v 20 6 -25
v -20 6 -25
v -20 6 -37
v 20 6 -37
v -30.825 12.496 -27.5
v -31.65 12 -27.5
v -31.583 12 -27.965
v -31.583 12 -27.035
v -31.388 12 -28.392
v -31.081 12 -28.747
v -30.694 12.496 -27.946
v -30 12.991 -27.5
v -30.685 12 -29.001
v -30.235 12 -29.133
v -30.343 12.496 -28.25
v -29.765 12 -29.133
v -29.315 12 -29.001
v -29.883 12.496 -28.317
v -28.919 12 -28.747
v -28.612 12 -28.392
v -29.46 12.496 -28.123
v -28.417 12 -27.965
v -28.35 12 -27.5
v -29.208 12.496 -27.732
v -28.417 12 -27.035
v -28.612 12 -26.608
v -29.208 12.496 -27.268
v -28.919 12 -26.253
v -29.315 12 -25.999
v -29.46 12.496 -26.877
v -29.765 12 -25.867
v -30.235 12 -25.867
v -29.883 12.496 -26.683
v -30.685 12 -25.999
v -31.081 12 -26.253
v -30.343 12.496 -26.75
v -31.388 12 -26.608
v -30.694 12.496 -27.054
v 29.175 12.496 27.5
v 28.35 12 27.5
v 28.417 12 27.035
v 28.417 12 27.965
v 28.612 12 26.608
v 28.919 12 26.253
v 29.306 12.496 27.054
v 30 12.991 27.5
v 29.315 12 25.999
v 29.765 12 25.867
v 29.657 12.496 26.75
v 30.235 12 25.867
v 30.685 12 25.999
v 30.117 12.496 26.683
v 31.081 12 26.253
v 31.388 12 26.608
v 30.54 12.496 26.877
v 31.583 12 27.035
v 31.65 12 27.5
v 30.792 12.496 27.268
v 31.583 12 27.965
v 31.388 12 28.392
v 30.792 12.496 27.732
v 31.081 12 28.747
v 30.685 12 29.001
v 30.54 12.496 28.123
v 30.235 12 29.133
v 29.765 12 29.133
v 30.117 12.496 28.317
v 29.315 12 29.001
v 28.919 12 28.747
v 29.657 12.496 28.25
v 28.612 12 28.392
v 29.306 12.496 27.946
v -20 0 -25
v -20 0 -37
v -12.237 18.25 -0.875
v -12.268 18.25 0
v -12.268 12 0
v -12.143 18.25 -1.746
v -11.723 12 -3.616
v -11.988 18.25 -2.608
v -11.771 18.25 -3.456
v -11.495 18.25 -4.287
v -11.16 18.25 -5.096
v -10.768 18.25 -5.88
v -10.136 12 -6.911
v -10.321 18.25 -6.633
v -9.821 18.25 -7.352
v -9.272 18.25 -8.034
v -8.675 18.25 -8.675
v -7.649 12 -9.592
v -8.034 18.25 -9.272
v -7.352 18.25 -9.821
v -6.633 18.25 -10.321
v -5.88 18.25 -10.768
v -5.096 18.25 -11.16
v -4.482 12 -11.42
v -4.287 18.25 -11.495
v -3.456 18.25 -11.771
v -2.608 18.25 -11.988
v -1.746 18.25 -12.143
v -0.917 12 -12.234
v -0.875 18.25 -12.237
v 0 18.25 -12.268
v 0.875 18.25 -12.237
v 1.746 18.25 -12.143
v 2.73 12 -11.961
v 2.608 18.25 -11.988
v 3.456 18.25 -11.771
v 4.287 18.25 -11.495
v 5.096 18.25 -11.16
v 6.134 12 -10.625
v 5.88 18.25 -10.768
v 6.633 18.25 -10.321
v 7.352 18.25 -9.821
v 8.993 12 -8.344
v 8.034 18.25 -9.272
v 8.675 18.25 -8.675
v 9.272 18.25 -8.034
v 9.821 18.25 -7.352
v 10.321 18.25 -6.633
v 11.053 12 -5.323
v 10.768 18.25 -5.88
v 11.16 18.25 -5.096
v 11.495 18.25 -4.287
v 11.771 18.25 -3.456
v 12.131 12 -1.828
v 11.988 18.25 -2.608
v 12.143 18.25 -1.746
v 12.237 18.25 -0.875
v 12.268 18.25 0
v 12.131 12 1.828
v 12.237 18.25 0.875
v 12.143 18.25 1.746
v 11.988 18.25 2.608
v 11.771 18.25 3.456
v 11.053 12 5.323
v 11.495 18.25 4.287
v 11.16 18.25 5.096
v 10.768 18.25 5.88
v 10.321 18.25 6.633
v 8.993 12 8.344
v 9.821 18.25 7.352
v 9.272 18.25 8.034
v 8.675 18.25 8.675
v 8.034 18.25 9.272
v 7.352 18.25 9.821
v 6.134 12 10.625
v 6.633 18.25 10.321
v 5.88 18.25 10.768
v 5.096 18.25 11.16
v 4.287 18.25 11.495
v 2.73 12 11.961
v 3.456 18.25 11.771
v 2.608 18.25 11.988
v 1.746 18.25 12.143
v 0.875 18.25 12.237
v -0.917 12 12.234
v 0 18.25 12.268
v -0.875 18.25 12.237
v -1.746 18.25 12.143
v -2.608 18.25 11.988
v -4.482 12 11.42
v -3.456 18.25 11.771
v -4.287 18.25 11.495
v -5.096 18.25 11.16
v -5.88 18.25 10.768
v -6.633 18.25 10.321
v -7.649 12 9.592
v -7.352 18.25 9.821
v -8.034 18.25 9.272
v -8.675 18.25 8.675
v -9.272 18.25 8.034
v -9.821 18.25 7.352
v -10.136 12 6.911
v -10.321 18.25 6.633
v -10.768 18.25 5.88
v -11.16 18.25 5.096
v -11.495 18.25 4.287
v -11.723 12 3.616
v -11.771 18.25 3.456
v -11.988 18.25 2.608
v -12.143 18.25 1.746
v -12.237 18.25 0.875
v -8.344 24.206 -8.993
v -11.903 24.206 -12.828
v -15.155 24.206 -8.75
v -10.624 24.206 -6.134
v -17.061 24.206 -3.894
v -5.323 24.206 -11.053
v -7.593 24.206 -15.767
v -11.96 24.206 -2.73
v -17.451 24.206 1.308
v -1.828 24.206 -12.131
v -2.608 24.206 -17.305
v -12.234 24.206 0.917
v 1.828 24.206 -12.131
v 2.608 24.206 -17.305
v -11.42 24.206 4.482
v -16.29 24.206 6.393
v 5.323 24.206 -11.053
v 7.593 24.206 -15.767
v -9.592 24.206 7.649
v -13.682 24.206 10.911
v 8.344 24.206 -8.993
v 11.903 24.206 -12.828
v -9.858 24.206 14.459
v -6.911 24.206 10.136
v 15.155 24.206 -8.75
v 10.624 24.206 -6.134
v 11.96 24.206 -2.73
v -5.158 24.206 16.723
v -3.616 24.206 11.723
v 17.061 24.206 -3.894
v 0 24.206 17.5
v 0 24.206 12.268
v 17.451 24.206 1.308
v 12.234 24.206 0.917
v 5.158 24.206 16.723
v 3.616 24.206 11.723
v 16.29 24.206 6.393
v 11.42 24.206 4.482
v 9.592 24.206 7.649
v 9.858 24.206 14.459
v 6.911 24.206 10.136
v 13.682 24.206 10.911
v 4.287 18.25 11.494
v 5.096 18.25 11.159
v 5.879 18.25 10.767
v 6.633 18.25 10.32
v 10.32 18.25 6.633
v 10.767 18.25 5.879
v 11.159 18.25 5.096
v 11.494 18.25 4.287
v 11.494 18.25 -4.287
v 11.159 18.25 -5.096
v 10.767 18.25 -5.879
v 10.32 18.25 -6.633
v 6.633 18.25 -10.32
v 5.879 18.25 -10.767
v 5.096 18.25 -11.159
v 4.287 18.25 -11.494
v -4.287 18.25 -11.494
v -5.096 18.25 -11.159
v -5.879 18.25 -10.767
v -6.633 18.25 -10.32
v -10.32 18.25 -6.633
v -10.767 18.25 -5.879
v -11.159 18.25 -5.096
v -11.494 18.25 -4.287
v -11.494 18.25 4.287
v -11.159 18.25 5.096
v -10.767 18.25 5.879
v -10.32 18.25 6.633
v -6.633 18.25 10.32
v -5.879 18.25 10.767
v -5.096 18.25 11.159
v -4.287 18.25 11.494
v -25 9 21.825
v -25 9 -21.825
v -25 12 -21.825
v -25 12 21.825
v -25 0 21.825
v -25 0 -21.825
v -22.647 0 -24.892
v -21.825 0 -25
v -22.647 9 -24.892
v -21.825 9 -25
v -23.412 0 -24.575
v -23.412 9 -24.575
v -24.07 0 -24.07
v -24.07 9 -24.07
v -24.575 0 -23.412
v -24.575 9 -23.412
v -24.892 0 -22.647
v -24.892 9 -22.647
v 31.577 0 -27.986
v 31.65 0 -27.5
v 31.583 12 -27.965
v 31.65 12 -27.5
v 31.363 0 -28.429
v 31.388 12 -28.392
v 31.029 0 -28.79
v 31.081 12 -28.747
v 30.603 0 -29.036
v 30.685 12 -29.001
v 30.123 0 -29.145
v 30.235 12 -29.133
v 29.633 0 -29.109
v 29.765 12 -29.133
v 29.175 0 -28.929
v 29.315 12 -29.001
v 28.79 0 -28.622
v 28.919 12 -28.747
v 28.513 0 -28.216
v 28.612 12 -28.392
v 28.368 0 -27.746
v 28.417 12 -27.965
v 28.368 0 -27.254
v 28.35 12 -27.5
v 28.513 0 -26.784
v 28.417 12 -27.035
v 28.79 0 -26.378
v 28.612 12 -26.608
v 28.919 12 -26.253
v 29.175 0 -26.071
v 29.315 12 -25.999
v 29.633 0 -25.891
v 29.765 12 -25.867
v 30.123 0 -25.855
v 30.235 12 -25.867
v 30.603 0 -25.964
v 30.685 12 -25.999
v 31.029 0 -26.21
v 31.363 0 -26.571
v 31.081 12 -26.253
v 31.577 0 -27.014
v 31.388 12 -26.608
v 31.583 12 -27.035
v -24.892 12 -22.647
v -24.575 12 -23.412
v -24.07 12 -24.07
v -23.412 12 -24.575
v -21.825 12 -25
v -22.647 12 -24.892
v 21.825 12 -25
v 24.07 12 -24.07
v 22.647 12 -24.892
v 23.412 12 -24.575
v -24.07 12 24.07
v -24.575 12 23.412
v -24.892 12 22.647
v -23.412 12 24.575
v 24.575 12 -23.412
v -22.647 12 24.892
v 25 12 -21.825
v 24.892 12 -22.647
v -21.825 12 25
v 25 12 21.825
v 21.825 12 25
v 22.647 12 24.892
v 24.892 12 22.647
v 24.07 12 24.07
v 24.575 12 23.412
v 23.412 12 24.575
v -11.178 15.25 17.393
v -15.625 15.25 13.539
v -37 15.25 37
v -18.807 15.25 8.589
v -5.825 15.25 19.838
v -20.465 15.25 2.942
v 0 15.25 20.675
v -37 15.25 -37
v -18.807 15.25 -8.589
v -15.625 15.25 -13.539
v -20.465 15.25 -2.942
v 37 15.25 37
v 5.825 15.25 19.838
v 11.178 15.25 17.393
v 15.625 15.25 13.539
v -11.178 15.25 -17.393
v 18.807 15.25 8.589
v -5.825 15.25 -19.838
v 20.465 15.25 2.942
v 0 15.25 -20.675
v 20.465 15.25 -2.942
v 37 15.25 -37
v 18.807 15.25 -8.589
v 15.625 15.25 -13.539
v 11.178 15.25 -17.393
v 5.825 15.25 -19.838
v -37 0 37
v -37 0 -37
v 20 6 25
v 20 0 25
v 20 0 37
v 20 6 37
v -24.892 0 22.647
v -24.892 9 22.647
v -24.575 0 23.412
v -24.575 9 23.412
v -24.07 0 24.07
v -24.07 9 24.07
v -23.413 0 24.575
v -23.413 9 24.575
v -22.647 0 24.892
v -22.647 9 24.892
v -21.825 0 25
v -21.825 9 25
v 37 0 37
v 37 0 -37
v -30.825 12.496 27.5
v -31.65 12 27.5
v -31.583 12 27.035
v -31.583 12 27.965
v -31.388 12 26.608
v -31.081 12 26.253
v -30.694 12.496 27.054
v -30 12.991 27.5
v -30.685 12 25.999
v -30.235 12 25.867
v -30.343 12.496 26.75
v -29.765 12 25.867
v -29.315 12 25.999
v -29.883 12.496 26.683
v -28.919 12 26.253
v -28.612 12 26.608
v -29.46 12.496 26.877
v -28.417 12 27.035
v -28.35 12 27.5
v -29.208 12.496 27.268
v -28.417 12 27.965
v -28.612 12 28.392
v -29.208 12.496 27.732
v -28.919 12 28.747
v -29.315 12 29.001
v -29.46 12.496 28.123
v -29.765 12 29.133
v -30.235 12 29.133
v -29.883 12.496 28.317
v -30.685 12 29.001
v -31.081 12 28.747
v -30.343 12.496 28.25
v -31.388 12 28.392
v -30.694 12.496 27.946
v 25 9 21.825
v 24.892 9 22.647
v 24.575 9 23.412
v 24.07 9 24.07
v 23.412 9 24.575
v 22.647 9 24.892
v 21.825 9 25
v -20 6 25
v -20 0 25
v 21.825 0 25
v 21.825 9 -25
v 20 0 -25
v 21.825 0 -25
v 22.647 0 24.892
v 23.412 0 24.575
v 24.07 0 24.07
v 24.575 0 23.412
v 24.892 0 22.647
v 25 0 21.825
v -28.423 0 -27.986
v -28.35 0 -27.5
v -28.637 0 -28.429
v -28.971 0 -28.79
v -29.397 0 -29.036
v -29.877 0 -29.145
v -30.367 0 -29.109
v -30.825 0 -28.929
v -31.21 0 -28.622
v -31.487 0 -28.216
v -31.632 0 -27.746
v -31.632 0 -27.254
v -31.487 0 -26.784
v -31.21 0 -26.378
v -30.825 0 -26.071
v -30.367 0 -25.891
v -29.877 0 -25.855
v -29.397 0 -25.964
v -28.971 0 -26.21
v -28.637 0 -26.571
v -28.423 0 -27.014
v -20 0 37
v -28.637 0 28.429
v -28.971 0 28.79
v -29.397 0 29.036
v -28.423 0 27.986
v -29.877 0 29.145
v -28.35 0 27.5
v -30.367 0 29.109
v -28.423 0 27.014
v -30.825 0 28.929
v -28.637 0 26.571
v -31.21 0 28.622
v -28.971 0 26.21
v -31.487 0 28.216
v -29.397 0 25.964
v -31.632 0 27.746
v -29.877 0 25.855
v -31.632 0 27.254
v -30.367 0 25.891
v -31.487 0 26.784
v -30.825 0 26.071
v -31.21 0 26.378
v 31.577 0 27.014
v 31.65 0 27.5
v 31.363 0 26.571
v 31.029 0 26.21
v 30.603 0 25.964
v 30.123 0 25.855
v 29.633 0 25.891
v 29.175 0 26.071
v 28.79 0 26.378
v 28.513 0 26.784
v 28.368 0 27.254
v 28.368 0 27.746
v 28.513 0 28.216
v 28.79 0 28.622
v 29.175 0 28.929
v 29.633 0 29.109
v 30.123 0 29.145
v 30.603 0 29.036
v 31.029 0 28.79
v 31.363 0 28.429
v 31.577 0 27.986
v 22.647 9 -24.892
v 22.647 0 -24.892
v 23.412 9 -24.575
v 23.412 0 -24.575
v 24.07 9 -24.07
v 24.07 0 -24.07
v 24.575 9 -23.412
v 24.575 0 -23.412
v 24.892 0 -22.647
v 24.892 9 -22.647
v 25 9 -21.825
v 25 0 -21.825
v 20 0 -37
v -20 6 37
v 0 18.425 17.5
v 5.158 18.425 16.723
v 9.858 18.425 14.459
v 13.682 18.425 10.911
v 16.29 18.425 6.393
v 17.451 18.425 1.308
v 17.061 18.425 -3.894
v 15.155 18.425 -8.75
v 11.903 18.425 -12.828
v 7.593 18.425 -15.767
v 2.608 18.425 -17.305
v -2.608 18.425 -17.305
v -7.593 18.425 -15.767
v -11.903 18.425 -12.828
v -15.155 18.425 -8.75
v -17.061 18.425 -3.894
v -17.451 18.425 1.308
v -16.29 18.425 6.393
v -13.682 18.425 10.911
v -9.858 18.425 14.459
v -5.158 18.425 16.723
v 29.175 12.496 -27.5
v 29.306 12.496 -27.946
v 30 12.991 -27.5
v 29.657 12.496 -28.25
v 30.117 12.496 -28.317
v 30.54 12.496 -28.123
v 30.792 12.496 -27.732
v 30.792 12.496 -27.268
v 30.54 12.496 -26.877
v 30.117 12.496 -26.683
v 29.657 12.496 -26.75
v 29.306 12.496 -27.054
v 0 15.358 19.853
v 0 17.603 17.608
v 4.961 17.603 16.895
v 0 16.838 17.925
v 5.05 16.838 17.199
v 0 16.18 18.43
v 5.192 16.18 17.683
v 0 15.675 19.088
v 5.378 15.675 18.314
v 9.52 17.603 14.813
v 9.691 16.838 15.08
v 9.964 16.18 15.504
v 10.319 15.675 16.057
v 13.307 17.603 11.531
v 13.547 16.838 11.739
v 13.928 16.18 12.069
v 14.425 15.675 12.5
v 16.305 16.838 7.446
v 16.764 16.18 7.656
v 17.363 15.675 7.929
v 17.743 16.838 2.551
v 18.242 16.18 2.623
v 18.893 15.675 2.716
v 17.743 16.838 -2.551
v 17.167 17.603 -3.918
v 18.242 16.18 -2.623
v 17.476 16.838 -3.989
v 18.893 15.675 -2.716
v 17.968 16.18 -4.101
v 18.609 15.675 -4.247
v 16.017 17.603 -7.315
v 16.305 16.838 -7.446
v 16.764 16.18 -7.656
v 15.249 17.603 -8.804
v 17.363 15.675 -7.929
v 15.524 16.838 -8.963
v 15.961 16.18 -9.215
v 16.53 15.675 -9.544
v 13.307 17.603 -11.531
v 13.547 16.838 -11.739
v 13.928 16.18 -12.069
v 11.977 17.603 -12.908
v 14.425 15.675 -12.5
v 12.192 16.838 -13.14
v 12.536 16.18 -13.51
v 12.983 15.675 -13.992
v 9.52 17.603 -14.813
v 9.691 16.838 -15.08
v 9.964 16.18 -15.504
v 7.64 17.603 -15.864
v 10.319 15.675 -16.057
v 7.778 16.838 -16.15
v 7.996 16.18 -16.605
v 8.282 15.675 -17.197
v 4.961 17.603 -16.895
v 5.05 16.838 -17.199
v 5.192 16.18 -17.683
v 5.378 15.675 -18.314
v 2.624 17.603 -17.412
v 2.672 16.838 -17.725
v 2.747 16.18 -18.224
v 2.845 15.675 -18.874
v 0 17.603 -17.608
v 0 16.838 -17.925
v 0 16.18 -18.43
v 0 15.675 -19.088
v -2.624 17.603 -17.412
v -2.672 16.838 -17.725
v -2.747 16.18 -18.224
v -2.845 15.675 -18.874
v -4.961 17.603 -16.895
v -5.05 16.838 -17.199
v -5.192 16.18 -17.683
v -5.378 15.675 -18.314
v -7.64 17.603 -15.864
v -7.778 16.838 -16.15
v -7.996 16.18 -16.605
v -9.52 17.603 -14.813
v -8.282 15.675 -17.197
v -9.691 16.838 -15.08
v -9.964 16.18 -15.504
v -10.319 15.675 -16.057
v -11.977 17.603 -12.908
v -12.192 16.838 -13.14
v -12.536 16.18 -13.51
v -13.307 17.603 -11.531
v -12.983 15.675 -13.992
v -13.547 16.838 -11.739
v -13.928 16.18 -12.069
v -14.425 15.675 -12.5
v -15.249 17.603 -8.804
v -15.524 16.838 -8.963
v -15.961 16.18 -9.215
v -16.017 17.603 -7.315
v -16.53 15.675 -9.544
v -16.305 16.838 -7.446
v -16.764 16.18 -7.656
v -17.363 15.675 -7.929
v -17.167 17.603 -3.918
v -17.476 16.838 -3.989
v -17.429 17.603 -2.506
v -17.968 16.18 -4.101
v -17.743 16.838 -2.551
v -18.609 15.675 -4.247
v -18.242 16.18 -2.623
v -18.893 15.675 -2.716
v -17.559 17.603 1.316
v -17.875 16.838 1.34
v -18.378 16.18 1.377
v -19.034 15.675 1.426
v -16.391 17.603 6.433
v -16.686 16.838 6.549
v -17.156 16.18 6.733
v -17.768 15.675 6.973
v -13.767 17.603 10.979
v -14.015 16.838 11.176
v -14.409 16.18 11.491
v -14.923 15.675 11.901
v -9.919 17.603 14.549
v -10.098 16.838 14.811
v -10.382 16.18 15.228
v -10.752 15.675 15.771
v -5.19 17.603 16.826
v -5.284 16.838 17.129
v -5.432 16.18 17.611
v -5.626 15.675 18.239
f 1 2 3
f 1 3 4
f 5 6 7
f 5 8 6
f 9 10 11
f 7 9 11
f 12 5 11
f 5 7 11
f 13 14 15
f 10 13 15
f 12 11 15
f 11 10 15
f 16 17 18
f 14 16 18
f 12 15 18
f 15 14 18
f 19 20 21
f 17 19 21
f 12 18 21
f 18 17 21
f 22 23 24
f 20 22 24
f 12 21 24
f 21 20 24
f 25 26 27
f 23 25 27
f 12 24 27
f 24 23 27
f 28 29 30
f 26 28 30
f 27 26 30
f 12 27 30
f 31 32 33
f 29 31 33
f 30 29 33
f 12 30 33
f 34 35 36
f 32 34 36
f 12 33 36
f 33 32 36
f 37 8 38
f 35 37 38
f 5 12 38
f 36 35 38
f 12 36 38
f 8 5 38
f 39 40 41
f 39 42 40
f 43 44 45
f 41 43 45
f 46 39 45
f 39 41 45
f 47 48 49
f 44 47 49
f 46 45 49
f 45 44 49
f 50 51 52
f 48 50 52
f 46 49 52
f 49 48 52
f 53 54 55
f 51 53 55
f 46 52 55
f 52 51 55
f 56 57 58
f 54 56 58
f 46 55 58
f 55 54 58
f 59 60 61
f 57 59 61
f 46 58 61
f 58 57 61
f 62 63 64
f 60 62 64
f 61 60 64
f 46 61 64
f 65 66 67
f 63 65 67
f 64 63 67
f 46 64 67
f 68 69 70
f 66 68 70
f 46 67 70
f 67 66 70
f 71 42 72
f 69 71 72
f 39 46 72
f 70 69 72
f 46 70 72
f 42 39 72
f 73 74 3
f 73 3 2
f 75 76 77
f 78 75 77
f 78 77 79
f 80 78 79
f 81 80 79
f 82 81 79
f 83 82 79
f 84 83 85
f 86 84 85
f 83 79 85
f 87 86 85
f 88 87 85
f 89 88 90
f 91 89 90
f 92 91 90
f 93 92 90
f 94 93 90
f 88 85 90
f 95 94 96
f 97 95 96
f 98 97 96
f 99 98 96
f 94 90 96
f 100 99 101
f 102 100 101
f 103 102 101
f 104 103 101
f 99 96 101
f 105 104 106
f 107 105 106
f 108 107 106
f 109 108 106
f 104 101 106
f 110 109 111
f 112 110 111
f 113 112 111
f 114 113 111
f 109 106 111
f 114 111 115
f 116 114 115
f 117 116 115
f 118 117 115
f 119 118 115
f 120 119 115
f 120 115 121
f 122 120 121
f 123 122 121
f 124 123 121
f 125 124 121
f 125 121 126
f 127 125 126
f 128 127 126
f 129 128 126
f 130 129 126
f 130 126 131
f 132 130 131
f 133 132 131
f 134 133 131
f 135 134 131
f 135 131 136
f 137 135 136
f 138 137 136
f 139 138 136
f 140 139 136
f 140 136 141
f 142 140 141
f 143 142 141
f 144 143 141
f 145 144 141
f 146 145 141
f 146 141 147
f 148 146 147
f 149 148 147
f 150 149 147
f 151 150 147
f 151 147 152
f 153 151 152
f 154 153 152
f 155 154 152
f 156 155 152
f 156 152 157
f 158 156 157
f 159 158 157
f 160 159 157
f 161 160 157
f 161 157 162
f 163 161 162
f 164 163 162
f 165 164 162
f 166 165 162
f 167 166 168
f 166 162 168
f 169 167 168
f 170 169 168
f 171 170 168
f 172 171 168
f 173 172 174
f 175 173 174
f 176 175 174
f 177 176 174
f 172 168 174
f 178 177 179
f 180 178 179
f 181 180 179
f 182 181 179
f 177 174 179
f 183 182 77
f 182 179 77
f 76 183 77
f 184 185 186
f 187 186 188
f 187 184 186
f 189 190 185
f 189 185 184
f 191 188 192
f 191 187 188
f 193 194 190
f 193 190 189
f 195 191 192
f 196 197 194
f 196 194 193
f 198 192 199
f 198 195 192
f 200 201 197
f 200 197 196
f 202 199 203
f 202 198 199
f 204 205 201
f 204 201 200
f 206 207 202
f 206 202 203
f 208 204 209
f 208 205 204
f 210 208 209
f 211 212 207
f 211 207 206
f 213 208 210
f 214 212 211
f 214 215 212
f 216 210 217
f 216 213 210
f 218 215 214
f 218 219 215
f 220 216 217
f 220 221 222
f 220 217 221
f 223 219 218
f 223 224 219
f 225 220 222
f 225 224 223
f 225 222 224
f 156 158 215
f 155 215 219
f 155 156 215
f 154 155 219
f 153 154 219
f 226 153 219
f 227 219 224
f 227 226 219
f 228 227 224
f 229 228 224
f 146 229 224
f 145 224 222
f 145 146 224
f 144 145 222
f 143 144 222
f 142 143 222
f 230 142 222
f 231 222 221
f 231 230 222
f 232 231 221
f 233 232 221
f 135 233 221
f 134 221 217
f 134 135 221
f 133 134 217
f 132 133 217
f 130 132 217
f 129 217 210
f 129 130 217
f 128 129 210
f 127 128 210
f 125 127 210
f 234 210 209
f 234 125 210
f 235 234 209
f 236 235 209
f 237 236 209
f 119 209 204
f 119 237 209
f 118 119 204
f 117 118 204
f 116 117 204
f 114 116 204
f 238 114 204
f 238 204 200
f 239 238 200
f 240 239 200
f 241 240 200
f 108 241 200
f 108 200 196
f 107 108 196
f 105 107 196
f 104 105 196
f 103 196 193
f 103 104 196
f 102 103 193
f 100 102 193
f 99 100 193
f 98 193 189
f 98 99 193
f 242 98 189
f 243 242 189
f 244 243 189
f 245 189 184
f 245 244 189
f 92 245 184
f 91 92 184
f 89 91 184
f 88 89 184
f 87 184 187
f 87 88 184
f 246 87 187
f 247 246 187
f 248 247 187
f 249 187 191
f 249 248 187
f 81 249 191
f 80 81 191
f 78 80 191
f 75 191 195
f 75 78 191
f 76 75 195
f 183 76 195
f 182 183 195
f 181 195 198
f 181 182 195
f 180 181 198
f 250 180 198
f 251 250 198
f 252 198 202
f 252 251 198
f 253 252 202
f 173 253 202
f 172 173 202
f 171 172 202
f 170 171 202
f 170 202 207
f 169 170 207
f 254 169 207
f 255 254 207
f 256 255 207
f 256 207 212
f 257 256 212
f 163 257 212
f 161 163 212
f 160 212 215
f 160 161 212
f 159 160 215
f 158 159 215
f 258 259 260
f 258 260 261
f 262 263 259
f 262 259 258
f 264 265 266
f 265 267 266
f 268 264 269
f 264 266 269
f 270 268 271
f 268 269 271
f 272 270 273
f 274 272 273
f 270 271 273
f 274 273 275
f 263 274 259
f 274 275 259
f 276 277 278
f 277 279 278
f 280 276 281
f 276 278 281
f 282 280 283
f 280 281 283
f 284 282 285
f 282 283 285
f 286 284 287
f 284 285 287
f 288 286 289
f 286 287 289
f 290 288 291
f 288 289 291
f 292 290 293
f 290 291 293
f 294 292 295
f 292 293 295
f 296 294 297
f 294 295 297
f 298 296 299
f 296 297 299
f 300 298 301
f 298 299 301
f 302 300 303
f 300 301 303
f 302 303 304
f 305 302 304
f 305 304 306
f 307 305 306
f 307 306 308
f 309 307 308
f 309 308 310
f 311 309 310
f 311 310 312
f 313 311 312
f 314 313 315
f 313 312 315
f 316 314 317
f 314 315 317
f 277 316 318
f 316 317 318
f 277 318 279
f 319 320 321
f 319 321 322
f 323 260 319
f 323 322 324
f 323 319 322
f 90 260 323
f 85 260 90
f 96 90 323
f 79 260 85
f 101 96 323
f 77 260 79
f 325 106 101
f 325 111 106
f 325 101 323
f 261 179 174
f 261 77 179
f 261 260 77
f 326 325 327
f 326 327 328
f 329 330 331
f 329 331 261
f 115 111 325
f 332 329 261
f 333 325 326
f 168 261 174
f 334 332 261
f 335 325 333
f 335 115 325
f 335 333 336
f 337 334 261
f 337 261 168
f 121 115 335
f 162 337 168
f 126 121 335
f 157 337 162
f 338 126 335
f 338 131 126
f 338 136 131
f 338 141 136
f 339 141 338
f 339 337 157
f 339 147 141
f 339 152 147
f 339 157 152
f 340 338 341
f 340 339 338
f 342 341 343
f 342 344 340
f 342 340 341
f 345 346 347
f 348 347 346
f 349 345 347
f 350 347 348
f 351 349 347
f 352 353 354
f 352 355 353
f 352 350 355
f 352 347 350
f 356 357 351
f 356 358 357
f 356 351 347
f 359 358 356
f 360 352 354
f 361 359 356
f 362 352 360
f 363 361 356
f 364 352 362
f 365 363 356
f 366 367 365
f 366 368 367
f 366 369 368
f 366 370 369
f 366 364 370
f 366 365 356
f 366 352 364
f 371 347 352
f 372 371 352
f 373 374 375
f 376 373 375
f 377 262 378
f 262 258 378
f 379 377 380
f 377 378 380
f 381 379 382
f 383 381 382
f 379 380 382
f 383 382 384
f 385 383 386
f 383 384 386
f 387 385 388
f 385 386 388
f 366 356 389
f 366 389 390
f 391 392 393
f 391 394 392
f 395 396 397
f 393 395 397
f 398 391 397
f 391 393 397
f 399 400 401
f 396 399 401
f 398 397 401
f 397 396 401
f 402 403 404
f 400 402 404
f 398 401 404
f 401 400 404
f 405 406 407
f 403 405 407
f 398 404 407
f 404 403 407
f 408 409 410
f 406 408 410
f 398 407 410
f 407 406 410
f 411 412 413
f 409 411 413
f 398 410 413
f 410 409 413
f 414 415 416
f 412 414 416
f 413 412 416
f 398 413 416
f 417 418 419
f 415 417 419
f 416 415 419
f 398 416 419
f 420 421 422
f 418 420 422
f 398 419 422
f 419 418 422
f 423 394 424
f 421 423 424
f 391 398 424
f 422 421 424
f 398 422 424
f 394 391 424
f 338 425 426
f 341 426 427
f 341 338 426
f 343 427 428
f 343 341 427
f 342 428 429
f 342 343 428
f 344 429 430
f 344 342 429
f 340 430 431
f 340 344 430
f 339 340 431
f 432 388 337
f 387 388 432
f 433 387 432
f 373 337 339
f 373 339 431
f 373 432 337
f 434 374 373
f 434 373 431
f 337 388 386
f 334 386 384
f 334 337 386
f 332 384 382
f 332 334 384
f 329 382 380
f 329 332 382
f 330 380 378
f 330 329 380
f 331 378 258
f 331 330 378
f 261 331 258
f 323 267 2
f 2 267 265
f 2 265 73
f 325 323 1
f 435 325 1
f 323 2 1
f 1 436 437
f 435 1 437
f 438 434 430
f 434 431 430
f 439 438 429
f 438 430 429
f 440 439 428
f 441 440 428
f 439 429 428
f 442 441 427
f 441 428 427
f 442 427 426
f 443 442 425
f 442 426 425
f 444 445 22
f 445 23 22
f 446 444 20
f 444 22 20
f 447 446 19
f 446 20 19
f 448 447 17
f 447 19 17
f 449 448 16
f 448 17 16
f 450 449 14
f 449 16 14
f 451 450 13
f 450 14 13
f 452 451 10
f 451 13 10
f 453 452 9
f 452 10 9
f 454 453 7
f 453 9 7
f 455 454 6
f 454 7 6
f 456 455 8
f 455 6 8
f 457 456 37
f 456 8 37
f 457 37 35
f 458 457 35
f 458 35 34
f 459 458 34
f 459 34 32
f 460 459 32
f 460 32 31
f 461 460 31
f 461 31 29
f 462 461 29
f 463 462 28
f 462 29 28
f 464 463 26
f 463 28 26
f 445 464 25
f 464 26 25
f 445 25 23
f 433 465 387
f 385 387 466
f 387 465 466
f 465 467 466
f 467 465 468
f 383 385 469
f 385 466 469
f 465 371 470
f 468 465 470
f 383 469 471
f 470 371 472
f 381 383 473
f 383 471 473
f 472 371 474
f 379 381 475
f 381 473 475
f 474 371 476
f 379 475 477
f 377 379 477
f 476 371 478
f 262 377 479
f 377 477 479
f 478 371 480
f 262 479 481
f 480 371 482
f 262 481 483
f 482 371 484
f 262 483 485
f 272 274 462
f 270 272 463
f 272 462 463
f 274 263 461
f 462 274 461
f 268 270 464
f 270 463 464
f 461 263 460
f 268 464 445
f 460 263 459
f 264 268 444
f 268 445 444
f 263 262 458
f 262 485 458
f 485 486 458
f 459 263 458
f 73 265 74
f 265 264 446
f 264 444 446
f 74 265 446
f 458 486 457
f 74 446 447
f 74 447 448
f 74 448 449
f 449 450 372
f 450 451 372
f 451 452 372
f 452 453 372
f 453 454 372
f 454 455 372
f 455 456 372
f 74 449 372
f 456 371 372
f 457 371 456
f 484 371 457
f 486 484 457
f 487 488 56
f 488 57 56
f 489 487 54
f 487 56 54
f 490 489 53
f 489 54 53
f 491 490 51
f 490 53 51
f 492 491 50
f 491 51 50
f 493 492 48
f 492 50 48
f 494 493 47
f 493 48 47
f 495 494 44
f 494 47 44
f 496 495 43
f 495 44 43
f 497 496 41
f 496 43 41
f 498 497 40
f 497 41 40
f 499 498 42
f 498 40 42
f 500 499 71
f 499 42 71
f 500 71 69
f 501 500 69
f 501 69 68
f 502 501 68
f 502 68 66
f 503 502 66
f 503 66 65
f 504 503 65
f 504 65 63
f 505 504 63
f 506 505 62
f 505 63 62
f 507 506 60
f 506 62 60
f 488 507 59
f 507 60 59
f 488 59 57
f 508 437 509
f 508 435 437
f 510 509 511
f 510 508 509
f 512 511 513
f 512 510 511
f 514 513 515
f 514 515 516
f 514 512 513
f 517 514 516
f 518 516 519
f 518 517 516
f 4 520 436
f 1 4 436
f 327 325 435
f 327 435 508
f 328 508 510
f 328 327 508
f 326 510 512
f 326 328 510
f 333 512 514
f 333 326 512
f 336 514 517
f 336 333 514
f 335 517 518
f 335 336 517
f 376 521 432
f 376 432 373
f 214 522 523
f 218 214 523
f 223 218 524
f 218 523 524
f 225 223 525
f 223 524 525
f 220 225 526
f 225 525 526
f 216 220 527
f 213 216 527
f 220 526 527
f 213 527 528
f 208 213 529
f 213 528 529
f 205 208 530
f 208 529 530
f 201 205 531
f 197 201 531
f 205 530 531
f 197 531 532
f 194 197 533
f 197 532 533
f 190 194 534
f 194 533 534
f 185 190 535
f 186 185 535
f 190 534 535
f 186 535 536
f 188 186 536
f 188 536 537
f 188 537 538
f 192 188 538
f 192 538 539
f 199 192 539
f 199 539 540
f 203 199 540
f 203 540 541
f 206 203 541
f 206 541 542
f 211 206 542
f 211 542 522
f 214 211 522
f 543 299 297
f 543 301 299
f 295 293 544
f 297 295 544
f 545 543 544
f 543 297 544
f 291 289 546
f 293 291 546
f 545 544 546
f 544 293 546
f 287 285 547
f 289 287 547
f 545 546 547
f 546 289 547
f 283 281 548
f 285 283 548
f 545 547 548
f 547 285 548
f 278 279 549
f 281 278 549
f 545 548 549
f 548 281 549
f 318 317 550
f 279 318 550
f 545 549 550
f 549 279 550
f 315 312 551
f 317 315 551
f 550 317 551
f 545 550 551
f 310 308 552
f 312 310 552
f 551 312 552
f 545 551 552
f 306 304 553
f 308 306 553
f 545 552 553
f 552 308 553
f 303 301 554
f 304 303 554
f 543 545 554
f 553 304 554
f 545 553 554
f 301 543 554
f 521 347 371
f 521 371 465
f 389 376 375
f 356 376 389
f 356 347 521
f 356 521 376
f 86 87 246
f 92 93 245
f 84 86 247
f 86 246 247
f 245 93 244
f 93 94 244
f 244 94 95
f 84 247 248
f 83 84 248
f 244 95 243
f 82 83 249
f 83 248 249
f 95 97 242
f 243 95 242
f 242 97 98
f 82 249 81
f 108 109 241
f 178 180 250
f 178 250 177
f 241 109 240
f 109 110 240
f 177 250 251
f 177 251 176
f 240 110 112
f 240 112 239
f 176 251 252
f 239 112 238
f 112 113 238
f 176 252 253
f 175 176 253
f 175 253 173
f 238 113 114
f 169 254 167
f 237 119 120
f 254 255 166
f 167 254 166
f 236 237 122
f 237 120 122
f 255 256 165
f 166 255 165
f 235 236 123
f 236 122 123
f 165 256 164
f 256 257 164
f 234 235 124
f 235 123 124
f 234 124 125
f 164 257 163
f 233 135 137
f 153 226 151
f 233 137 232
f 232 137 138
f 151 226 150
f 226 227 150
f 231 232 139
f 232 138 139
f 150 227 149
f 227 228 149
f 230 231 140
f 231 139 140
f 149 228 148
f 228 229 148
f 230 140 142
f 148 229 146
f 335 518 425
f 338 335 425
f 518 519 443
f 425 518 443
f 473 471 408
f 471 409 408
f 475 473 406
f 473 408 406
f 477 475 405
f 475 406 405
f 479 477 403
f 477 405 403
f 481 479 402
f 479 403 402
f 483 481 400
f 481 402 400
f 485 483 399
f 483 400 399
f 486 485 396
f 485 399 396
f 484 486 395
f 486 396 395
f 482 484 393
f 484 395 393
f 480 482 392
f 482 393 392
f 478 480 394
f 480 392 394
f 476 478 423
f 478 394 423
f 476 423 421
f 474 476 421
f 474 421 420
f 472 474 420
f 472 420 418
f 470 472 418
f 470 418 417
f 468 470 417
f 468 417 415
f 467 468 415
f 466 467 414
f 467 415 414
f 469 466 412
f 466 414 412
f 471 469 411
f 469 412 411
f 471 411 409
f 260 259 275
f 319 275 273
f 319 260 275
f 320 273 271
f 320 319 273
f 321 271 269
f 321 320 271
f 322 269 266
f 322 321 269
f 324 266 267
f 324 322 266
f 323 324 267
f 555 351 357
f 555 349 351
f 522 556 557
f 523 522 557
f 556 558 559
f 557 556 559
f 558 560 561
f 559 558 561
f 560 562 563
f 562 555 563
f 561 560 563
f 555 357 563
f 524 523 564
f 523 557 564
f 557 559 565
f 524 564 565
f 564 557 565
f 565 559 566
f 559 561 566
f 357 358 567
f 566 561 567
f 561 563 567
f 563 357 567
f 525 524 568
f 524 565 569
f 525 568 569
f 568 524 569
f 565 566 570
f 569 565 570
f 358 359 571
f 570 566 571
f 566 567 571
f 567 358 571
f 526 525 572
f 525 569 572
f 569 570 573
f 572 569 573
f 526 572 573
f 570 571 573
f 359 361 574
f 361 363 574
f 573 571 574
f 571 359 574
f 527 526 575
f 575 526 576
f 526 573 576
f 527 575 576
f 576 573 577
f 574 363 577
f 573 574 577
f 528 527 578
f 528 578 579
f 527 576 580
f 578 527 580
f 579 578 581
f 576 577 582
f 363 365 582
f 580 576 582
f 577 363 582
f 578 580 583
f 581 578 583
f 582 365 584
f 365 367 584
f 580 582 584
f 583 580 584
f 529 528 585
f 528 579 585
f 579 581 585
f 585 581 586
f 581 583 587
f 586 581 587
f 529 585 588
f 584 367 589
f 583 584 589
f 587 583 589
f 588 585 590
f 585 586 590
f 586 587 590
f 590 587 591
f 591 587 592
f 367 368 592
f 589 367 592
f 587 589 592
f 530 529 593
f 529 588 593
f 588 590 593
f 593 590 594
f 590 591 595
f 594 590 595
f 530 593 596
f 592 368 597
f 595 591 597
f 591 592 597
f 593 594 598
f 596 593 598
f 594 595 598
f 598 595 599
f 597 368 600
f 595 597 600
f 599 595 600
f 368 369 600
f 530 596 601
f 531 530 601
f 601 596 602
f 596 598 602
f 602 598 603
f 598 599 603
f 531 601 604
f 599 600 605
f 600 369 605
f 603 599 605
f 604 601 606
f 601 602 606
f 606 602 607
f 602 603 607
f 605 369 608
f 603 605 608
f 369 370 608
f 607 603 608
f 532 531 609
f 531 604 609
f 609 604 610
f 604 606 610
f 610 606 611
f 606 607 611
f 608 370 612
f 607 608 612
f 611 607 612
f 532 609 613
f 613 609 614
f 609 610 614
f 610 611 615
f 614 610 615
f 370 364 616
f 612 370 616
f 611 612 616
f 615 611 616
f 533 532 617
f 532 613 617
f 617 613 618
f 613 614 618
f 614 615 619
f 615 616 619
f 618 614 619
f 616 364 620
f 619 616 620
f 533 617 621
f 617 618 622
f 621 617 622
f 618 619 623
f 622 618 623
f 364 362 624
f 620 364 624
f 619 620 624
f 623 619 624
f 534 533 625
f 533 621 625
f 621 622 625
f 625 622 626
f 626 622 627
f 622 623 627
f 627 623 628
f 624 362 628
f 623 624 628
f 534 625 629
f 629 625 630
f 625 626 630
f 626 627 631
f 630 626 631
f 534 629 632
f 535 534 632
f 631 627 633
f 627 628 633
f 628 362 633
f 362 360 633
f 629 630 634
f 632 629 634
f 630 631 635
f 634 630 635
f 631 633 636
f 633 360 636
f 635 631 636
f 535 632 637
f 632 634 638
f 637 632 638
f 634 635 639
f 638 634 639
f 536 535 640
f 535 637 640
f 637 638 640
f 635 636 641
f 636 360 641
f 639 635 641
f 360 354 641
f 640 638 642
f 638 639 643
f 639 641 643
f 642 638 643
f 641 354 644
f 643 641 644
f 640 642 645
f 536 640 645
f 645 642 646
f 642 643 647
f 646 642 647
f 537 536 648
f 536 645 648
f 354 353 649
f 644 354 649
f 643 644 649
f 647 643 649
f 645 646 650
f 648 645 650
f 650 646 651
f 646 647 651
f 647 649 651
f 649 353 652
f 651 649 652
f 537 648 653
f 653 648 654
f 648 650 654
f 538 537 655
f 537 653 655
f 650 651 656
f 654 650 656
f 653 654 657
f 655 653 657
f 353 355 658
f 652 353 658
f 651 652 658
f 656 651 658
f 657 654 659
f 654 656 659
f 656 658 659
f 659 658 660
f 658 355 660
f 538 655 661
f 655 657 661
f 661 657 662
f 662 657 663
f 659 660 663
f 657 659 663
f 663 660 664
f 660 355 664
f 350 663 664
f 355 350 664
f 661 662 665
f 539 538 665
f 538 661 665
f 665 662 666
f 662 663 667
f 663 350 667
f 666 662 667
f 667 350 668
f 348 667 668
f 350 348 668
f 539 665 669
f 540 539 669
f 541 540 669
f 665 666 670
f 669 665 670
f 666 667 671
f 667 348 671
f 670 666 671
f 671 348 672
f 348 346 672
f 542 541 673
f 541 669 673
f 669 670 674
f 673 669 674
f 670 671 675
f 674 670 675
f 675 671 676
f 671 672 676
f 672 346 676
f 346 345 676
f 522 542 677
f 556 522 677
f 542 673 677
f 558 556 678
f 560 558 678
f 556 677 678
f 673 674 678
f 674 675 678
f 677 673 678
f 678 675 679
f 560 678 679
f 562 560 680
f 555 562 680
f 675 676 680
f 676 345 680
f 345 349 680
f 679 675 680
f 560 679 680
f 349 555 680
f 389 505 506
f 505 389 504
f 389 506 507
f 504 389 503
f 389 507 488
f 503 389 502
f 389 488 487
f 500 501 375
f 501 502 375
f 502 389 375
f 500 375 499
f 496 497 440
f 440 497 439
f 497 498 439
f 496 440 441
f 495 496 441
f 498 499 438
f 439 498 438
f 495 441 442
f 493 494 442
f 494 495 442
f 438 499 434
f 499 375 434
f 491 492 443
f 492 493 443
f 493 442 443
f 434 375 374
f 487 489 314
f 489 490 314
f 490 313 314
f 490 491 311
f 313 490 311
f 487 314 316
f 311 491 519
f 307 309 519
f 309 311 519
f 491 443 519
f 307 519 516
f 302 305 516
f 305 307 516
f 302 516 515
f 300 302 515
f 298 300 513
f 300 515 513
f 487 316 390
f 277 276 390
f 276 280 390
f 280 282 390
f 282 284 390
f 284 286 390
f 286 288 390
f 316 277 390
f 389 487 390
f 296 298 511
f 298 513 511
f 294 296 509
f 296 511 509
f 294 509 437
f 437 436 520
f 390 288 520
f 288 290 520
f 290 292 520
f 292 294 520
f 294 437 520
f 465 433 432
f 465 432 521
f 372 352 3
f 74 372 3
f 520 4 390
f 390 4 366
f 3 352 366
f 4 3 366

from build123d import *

# Parameters (mm, degrees)
OUTLINE_DEPTH        = 40
OUTLINE_DEPTH_BACK   = 40
SKETCH1_W            = 18.25
SKETCH1_H            = 40
SKETCH2_W            = 40
SKETCH2_H            = 80
EXTRUSION15_DEPTH    = 6
CAMERA_MOUNT_D       = 24.5364
SKETCH5_R            = 17.5
SKETCH5_R_2          = 12.268
EXTRUSION19_DEPTH    = 5.9562
CUT_EXTRUDE1_START   = -3
SKETCH10_W           = 80
SKETCH10_H           = 80
SKETCH10_R           = 17.5
CUT_EXTRUDE1_DEPTH   = 3
SKETCH7_W            = 50
SKETCH7_H            = 50
EXTRUSION22_DEPTH    = 9
FILLET4_R            = 3.175
HOLE7_D              = 3.3
HOLE7_DEPTH          = 12
HOLE7_TIP            = 0.991420021
SKETCH11_OUTSIDE_W   = 105.14
SKETCH11_OUTSIDE_H   = 105.14
SKETCH11_OUTSIDE_W_2 = 74
SKETCH11_OUTSIDE_H_2 = 74
CUT_EXTRUDE2_DEPTH   = 59.588074725
CUT_EXTRUDE3_START   = -3
CUT_EXTRUDE3_DEPTH   = 3


with BuildPart() as part:
    # Sketch1 → Outline (new, two sides: drawn at the far end of the back side and taken through both)
    with BuildSketch(Plane.YZ.offset(-OUTLINE_DEPTH_BACK)):
        Polygon((18.25, 40), (5.33, 40), (0, 40), (0, 0), (18.25, 0), align=None)
        with Locations((9.125, -20)):
            Rectangle(SKETCH1_W, SKETCH1_H)
    extrude(amount=OUTLINE_DEPTH + OUTLINE_DEPTH_BACK)

    # Sketch2 → Extrusion15 (cut)
    with BuildSketch(Plane.XZ):
        Rectangle(SKETCH2_W, SKETCH2_H)
    extrude(amount=-EXTRUSION15_DEPTH, mode=Mode.SUBTRACT)

    # Camera mount (through all)
    with Locations(Plane(origin=(0, 18.25, 0), x_dir=(1, 0, 0), z_dir=(0, 1, 0))):
        with Locations((0, 0)):
            Hole(CAMERA_MOUNT_D / 2)

    # Sketch5 → Extrusion19 (add)
    with BuildSketch(Plane(origin=(0, 18.25, 0), x_dir=(-1, 0, 0), z_dir=(0, 1, 0))):
        with Locations(Location((0, 0, 0), (0, 0, 90))):
            Circle(SKETCH5_R)
        with Locations(Location((0, 0, 0), (0, 0, 90))):
            Circle(SKETCH5_R_2, mode=Mode.SUBTRACT)
    extrude(amount=EXTRUSION19_DEPTH)

    # Sketch10 → Cut-Extrude1 (cut)
    with BuildSketch(Plane(origin=(0, 18.25, 0), x_dir=(1, 0, 0), z_dir=(0, 1, 0)).offset(CUT_EXTRUDE1_START)):
        Rectangle(SKETCH10_W, SKETCH10_H)
        with Locations(Location((0, 0, 0), (0, 0, 270))):
            Circle(SKETCH10_R, mode=Mode.SUBTRACT)
    extrude(amount=CUT_EXTRUDE1_DEPTH, mode=Mode.SUBTRACT)

    # Sketch7 → Extrusion22 (cut)
    with BuildSketch(Plane.XZ):
        Rectangle(SKETCH7_W, SKETCH7_H)
    extrude(amount=-EXTRUSION22_DEPTH, mode=Mode.SUBTRACT)

    # Fillet4
    fillet4_edges = [part.edges().sort_by_distance(p)[0] for p in [
        (0, 15.25, -17.5),
        (-25, 4.5, 25),
        (25, 4.5, -25),
        (-25, 4.5, -25),
        (25, 4.5, 25),
    ]]
    fillet(fillet4_edges, radius=FILLET4_R)

    # Hole7
    with Locations(Plane(origin=(0, 0, 0), x_dir=(-1, 0, 0), z_dir=(0, -1, 0))):
        with Locations((30, 27.5), (-30, 27.5), (-30, -27.5), (30, -27.5)):
            Hole(HOLE7_D / 2, depth=HOLE7_DEPTH)
            with Locations((0, 0, -(HOLE7_DEPTH + HOLE7_TIP / 2))):  # 118° drill point
                Cone(0, HOLE7_D / 2, HOLE7_TIP, mode=Mode.SUBTRACT)

    # Sketch11 outside → Cut-Extrude2 (cut, through all)
    with BuildSketch(Plane(origin=(0, 15.25, 0), x_dir=(1, 0, 0), z_dir=(0, 1, 0))):
        Rectangle(SKETCH11_OUTSIDE_W, SKETCH11_OUTSIDE_H)
        Rectangle(SKETCH11_OUTSIDE_W_2, SKETCH11_OUTSIDE_H_2, mode=Mode.SUBTRACT)
    extrude(amount=-CUT_EXTRUDE2_DEPTH, mode=Mode.SUBTRACT)

    # Sketch13 → Cut-Extrude3 (cut)
    with BuildSketch(Plane.XZ.offset(-9).offset(CUT_EXTRUDE3_START)):
        with BuildLine():
            Line((21.825, 25), (-21.825, 25))
            ThreePointArc((-21.825, 25), (-24.07006403, 24.07006403), (-25, 21.825))
            Line((-25, 21.825), (-25, -21.825))
            ThreePointArc((-25, -21.825), (-24.07006403, -24.07006403), (-21.825, -25))
            Line((-21.825, -25), (21.825, -25))
            ThreePointArc((21.825, -25), (24.07006403, -24.07006403), (25, -21.825))
            Line((25, -21.825), (25, 21.825))
            ThreePointArc((25, 21.825), (24.07006403, 24.07006403), (21.825, 25))
        make_face()
    extrude(amount=CUT_EXTRUDE3_DEPTH, mode=Mode.SUBTRACT)


solid = part.part
